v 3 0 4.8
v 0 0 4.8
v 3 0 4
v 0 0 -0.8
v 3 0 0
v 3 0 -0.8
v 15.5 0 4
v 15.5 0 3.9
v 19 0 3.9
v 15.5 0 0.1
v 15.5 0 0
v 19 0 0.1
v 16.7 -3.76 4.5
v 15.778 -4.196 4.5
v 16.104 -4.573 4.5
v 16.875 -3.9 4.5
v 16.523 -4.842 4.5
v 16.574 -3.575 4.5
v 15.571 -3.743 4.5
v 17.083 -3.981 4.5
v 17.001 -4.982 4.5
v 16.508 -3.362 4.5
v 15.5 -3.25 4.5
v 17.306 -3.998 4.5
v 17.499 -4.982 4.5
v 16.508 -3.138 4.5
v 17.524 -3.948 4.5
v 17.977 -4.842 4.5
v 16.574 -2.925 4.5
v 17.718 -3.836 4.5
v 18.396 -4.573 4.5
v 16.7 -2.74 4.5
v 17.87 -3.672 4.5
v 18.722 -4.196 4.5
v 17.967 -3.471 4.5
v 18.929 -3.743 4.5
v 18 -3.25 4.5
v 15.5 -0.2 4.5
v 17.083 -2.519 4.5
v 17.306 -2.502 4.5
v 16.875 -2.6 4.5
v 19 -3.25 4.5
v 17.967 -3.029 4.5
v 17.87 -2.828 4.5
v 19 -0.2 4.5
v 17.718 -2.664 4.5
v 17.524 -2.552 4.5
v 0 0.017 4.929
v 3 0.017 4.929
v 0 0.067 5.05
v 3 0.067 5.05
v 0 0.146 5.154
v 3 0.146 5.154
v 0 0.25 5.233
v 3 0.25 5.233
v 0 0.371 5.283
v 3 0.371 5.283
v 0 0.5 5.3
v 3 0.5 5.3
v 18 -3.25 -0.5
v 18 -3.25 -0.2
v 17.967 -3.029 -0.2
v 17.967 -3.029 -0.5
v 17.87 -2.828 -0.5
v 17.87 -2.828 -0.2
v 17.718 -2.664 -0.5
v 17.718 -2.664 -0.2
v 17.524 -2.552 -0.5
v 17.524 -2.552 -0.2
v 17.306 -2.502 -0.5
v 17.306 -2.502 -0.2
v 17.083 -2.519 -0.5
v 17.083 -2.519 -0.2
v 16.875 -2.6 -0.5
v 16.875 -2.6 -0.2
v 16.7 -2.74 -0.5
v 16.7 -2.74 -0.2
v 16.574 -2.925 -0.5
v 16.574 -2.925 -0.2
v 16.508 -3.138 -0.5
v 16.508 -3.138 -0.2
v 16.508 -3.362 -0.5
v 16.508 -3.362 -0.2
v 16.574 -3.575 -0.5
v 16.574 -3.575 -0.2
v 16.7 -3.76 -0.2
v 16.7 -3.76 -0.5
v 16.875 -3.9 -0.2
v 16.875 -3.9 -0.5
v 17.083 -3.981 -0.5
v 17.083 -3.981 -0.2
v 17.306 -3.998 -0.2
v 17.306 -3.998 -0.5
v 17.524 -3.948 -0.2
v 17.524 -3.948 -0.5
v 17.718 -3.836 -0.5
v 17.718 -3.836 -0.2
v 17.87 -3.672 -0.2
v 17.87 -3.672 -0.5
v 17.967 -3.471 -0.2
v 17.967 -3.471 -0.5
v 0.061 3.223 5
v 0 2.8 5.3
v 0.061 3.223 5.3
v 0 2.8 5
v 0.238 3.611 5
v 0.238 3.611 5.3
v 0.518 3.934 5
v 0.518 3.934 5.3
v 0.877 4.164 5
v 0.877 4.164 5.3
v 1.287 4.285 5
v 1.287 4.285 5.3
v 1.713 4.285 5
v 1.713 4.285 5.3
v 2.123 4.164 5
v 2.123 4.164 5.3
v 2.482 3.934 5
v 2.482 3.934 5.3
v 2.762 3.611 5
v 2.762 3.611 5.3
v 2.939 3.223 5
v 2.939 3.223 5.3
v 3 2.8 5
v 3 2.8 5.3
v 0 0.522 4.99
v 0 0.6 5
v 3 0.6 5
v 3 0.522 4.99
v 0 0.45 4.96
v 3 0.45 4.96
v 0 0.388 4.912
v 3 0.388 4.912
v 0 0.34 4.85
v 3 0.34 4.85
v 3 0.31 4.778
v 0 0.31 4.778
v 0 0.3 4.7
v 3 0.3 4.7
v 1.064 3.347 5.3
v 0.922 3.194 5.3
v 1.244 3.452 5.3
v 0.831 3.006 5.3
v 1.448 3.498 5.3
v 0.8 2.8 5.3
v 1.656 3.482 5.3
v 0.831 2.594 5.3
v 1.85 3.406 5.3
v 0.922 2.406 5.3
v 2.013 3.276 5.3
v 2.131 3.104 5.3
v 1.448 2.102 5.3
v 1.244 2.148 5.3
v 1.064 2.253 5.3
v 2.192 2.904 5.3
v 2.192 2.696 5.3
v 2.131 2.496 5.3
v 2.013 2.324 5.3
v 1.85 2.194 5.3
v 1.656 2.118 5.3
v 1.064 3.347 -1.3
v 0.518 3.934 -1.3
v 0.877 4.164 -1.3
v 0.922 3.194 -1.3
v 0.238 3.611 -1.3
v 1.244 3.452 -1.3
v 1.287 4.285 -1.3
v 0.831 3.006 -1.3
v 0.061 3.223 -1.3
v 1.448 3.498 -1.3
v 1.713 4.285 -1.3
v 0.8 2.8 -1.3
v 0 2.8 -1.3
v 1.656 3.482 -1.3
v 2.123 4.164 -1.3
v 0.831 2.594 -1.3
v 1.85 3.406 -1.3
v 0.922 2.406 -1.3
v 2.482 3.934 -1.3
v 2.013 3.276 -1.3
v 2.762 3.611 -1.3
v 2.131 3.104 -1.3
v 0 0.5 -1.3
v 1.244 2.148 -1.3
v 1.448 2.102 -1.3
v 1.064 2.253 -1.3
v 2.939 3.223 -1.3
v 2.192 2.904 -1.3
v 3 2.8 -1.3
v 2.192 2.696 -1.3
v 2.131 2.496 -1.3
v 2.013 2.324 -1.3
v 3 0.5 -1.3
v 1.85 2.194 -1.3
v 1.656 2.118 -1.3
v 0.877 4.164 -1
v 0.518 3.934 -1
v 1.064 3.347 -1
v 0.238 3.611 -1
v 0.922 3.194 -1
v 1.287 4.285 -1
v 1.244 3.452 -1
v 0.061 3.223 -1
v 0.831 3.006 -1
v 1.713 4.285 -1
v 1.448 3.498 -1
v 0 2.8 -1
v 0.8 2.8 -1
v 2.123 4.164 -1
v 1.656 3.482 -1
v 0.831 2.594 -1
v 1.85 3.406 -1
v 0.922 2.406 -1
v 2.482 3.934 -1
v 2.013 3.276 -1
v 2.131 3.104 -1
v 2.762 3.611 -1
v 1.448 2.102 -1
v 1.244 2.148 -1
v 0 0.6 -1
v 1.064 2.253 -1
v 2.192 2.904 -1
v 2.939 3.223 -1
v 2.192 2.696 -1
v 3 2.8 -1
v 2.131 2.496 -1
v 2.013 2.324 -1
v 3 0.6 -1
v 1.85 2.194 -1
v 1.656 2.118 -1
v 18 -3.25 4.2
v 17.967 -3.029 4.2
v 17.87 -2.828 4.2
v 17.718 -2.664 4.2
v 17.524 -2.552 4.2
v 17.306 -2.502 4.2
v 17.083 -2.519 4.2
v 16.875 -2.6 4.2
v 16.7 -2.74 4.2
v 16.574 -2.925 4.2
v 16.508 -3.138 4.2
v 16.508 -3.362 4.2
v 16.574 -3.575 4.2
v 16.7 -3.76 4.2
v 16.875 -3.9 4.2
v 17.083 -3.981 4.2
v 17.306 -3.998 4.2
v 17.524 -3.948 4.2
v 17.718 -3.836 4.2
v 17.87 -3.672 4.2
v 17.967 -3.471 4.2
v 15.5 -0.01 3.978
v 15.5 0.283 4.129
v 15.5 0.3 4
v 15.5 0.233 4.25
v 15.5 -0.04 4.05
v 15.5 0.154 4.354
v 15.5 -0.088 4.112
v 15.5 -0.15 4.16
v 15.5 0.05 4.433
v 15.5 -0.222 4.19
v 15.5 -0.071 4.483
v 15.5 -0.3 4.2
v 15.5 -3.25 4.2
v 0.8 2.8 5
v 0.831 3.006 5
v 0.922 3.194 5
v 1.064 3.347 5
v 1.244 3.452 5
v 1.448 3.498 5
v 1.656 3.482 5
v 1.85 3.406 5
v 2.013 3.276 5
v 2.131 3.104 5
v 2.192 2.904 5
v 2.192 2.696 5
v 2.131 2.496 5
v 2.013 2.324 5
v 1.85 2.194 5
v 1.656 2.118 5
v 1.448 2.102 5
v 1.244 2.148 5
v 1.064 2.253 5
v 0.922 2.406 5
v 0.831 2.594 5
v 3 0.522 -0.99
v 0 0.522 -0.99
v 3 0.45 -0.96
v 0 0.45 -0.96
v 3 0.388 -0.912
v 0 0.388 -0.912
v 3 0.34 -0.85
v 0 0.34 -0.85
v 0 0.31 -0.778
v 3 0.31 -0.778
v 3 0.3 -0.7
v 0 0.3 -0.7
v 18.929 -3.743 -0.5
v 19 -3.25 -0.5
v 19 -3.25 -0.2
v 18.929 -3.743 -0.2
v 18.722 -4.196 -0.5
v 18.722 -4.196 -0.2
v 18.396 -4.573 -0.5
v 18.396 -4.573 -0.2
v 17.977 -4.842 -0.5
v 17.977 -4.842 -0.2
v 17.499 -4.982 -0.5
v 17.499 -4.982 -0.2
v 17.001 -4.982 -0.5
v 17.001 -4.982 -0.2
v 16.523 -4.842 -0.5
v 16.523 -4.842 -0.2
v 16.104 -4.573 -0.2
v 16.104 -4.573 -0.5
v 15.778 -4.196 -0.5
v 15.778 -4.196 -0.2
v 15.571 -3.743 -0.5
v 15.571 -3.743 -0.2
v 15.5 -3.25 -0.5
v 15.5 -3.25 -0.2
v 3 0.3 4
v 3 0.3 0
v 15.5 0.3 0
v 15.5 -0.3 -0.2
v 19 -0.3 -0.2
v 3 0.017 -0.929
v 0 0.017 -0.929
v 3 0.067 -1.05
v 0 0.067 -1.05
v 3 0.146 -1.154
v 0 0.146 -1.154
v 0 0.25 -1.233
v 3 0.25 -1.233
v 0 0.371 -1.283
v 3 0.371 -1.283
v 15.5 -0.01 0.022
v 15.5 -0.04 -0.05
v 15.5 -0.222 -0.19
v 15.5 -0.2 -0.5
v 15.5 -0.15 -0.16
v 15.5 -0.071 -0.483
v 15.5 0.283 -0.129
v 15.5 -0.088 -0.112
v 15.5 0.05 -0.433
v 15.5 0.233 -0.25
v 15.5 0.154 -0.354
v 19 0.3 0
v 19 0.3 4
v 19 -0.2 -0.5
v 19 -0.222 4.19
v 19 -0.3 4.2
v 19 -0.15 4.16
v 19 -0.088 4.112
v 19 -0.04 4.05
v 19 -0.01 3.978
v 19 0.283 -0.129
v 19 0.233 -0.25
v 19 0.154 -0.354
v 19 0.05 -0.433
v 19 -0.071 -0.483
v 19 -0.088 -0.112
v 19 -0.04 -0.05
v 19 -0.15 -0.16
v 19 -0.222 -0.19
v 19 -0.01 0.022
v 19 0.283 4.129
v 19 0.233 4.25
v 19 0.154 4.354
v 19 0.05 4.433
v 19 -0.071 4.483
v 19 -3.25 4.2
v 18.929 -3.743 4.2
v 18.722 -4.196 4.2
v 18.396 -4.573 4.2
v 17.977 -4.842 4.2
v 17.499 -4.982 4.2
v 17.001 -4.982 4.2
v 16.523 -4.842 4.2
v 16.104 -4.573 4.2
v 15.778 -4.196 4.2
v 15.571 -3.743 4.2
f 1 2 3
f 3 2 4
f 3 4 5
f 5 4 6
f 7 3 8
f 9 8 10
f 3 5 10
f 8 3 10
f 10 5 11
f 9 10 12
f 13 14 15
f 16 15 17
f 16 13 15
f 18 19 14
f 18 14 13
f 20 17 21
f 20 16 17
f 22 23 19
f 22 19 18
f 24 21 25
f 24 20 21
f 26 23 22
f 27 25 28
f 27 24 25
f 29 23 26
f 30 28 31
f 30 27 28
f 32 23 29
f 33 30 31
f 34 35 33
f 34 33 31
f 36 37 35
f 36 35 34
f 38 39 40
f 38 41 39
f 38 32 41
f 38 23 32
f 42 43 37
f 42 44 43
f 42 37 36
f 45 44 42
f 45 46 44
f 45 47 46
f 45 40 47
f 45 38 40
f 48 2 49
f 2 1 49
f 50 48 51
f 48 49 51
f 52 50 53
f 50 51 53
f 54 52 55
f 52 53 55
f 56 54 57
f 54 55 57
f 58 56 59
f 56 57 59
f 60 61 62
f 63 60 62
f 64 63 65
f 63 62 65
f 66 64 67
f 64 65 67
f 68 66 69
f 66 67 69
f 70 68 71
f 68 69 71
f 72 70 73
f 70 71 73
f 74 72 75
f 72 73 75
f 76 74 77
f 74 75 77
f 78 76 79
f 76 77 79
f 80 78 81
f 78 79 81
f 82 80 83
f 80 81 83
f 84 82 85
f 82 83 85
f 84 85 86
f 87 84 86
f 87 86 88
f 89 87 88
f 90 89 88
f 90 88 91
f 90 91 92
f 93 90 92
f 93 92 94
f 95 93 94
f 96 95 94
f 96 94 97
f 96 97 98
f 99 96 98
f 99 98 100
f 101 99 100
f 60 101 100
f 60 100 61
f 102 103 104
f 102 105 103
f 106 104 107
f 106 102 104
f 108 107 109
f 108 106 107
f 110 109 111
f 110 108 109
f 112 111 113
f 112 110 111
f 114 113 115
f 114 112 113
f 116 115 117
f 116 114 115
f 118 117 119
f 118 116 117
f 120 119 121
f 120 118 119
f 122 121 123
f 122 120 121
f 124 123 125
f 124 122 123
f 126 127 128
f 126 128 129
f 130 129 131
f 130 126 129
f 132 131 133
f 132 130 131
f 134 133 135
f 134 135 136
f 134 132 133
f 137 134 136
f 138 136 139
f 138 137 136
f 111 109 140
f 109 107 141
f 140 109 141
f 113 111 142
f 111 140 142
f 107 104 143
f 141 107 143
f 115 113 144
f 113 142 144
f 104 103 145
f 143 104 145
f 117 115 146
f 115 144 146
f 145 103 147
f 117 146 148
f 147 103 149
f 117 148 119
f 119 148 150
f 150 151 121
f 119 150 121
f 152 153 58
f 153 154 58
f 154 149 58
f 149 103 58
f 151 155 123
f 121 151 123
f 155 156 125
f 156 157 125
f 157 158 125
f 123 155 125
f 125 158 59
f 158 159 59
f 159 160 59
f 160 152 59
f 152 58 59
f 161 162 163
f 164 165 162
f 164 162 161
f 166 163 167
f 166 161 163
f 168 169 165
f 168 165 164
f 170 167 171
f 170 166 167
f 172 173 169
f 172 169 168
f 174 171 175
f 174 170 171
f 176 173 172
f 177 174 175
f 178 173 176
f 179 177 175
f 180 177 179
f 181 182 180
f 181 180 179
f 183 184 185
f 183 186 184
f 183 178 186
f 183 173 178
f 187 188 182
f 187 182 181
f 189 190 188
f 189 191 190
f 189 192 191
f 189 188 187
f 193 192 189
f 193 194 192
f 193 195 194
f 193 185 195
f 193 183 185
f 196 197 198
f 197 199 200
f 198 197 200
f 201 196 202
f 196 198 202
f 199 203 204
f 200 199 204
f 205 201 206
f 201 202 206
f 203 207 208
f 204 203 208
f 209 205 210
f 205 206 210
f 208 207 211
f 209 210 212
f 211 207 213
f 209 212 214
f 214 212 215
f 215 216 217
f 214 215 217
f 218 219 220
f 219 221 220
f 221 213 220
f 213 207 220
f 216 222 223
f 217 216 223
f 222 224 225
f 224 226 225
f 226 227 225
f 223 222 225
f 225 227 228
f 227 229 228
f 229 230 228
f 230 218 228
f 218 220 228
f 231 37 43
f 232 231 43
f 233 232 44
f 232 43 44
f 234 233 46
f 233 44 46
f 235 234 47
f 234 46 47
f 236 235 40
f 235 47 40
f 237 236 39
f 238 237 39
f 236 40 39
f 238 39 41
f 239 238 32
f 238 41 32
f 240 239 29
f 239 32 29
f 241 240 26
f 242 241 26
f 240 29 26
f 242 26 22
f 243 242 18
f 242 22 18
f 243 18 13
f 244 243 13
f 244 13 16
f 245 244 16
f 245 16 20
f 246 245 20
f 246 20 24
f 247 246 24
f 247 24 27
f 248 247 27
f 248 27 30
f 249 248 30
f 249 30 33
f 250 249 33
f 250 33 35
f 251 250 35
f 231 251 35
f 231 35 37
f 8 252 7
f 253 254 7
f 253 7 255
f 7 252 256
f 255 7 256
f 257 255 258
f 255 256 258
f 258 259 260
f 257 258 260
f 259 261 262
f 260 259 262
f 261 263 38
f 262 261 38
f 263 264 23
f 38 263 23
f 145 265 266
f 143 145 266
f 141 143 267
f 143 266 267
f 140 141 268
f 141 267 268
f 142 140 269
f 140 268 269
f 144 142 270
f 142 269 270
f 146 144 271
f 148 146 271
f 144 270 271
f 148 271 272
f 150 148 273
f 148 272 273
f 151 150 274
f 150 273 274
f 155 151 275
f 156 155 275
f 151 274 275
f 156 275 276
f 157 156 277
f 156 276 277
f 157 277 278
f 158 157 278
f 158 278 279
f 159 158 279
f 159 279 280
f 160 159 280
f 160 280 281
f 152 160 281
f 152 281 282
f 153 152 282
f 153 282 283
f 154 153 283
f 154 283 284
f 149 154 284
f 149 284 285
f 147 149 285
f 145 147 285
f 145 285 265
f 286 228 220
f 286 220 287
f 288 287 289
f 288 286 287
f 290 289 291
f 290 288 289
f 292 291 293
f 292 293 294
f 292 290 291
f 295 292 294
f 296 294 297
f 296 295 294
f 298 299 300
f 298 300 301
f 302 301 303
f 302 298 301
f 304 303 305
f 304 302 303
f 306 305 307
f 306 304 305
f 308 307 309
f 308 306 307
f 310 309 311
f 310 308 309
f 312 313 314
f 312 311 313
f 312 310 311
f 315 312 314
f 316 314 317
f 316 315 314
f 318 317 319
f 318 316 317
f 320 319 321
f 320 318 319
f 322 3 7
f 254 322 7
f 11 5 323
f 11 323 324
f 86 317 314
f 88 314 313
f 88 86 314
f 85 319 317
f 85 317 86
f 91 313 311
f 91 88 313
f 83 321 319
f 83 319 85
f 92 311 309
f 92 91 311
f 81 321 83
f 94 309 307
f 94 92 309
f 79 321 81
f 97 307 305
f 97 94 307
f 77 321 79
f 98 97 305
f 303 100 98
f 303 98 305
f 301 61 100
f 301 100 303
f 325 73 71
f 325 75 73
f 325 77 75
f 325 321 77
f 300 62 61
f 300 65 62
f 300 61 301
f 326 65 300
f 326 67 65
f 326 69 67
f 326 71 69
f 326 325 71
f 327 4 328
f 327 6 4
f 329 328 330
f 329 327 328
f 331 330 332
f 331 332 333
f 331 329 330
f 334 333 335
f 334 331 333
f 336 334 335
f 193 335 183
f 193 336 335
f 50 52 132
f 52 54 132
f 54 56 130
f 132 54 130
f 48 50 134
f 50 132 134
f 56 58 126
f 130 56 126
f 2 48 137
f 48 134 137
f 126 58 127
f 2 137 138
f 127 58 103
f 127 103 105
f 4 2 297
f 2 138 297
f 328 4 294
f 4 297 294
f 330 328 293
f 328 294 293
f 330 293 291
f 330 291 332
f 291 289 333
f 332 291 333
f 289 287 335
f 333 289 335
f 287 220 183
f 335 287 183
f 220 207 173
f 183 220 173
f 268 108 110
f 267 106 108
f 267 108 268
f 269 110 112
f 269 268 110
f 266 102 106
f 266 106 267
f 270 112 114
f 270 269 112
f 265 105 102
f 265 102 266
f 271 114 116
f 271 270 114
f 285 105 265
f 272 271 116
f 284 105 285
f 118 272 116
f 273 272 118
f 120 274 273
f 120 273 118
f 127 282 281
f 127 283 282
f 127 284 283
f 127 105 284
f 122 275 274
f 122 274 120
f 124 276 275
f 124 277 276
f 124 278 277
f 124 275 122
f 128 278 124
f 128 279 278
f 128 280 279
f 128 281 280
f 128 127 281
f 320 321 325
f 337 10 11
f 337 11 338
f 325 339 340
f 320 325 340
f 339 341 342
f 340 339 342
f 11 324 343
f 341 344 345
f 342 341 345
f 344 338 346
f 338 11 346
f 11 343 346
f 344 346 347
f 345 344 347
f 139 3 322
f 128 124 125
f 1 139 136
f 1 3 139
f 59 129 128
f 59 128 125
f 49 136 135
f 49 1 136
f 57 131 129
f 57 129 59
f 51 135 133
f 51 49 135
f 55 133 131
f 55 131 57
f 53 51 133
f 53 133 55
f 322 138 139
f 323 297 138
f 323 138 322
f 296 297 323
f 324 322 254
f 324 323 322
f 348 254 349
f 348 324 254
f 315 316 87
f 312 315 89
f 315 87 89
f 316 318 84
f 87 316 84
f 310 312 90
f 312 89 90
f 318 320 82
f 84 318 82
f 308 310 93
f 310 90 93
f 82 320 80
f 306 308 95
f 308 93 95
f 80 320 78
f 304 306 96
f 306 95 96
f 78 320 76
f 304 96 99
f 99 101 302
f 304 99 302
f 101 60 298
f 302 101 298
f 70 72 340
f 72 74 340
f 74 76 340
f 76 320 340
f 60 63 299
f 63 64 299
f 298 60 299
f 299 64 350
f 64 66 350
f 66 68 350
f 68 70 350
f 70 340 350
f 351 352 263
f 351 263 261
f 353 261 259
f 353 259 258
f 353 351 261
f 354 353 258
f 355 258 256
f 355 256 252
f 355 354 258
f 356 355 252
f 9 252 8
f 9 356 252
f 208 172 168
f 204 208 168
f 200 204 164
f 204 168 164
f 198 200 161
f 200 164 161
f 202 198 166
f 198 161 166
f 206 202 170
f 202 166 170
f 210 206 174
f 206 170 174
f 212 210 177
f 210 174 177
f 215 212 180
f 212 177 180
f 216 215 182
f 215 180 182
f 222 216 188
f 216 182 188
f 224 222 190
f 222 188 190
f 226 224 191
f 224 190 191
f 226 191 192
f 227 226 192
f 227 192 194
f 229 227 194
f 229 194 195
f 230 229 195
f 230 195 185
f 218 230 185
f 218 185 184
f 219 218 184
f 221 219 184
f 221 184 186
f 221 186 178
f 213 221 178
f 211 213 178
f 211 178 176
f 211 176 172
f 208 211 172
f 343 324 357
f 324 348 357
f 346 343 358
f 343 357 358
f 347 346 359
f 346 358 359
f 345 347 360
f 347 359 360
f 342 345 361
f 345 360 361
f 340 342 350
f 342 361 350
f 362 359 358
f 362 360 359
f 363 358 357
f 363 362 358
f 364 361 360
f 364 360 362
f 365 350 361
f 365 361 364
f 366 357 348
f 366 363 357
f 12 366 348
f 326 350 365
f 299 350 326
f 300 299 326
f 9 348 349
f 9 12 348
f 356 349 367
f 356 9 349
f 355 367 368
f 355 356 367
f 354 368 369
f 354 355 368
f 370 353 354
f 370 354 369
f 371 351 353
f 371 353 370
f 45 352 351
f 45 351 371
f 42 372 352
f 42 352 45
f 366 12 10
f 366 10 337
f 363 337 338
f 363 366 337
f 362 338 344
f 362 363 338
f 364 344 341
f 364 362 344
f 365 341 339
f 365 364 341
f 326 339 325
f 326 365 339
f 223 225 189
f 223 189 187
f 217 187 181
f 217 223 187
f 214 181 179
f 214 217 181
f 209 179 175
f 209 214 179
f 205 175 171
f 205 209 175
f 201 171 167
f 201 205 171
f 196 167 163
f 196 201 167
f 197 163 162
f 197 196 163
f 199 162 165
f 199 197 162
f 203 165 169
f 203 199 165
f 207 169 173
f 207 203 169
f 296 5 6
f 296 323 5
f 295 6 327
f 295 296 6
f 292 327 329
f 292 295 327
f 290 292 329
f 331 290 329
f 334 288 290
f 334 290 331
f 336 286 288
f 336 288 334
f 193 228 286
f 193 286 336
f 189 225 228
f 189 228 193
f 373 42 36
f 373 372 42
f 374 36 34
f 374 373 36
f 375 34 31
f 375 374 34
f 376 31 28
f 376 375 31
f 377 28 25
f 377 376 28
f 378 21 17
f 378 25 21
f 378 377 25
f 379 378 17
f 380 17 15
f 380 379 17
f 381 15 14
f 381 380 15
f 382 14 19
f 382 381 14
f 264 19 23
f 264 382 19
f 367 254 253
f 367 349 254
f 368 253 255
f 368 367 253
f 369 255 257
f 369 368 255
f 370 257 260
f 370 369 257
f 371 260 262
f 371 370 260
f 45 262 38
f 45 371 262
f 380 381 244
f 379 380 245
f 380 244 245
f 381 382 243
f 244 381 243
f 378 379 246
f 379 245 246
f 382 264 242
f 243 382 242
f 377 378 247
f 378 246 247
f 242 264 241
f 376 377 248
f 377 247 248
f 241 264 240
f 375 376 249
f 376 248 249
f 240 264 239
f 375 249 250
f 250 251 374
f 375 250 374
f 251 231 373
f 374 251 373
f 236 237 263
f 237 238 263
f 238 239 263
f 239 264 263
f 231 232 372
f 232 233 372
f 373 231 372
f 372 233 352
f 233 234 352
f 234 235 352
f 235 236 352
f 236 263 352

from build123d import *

# Parameters (mm, degrees)
SKETCH1_W           = 19
SKETCH1_H           = 4
BOSS_EXTRUDE1_DEPTH = 0.3
SKETCH2_W           = 3
SKETCH2_H           = 1.3
BOSS_EXTRUDE2_DEPTH = 0.3
SKETCH3_W           = 3
SKETCH3_H           = 0.3
BOSS_EXTRUDE3_DEPTH = 4
FILLET1_RADIUS      = 1.5
FILLET1_LENGTH      = 0.3
FILLET2_RADIUS      = 1.5
FILLET2_LENGTH      = 0.3
SKETCH4_R           = 0.7
CUT_EXTRUDE1_DEPTH  = 21.568179307
SKETCH6_W           = 3.5
SKETCH6_H           = 0.5
BOSS_EXTRUDE4_DEPTH = 0.3
SKETCH7_W           = 3.5
SKETCH7_H           = 0.3
BOSS_EXTRUDE5_DEPTH = 5
FILLET3_RADIUS      = 1.75
FILLET3_LENGTH      = 0.3
FILLET4_RADIUS      = 1.75
FILLET4_LENGTH      = 0.3
SKETCH8_R           = 0.75
CUT_EXTRUDE2_DEPTH  = 21.485116548
FILLET5_R           = 0.3
FILLET6_R           = 0.5


with BuildPart() as part:
    # Sketch1 → Boss-Extrude1 (new body)
    with BuildSketch(Plane(origin=(0, 0, 0), x_dir=(1, 0, 0), z_dir=(0, 1, 0))):
        with Locations((9.5, -2)):
            Rectangle(SKETCH1_W, SKETCH1_H)
    extrude(amount=BOSS_EXTRUDE1_DEPTH)

    # Sketch2 → Boss-Extrude2 (add)
    with BuildSketch(Plane.XZ):
        with Locations((1.5, -0.65)):
            Rectangle(SKETCH2_W, SKETCH2_H)
        with Locations((1.5, 4.65)):
            Rectangle(SKETCH2_W, SKETCH2_H)
    extrude(amount=-BOSS_EXTRUDE2_DEPTH)

    # Sketch3 → Boss-Extrude3 (add)
    with BuildSketch(Plane(origin=(0, 0.3, 0), x_dir=(1, 0, 0), z_dir=(0, 1, 0))):
        with Locations((1.5, 1.15)):
            Rectangle(SKETCH3_W, SKETCH3_H)
        with Locations((1.5, -5.15)):
            Rectangle(SKETCH3_W, SKETCH3_H)
    extrude(amount=BOSS_EXTRUDE3_DEPTH)

    # Fillet1: full round fillet: the end face becomes a half cylinder, R = half its width
    fillet1_face = Plane((1.5, 4.3, -1.15), x_dir=(0, 0, 1), z_dir=(0, 1, 0))  # on the end face: x along it, z out of the body
    fillet1_slab = fillet1_face.offset(-FILLET1_RADIUS / 2) * Box(FILLET1_LENGTH, 2 * FILLET1_RADIUS, FILLET1_RADIUS, mode=Mode.PRIVATE)  # the body's end, R deep
    fillet1_round = Plane((1.5, 2.8, -1.15), x_dir=(0, 1, 0), z_dir=(0, 0, 1)) * Cylinder(FILLET1_RADIUS, FILLET1_LENGTH, mode=Mode.PRIVATE)  # its axis R under the face
    add(fillet1_slab - fillet1_round, mode=Mode.SUBTRACT)

    # Fillet2: full round fillet: the end face becomes a half cylinder, R = half its width
    fillet2_face = Plane((1.5, 4.3, 5.15), x_dir=(0, 0, -1), z_dir=(0, 1, 0))  # on the end face: x along it, z out of the body
    fillet2_slab = fillet2_face.offset(-FILLET2_RADIUS / 2) * Box(FILLET2_LENGTH, 2 * FILLET2_RADIUS, FILLET2_RADIUS, mode=Mode.PRIVATE)  # the body's end, R deep
    fillet2_round = Plane((1.5, 2.8, 5.15), x_dir=(0, 1, 0), z_dir=(0, 0, -1)) * Cylinder(FILLET2_RADIUS, FILLET2_LENGTH, mode=Mode.PRIVATE)  # its axis R under the face
    add(fillet2_slab - fillet2_round, mode=Mode.SUBTRACT)

    # Sketch4 → Cut-Extrude1 (cut, through all)
    with BuildSketch(Plane(origin=(0, 0, -1.3), x_dir=(-1, 0, 0), z_dir=(0, 0, -1))):
        with Locations((-1.5, 2.8)):
            Circle(SKETCH4_R)
    extrude(amount=-CUT_EXTRUDE1_DEPTH, mode=Mode.SUBTRACT)

    # Sketch6 → Boss-Extrude4 (add)
    with BuildSketch(Plane(origin=(0, 0.3, 0), x_dir=(1, 0, 0), z_dir=(0, 1, 0))):
        with Locations((17.25, 0.25)):
            Rectangle(SKETCH6_W, SKETCH6_H)
        with Locations((17.25, -4.25)):
            Rectangle(SKETCH6_W, SKETCH6_H)
    extrude(amount=-BOSS_EXTRUDE4_DEPTH)

    # Sketch7 → Boss-Extrude5 (add)
    with BuildSketch(Plane.XZ):
        with Locations((17.25, -0.35)):
            Rectangle(SKETCH7_W, SKETCH7_H)
        with Locations((17.25, 4.35)):
            Rectangle(SKETCH7_W, SKETCH7_H)
    extrude(amount=BOSS_EXTRUDE5_DEPTH)

    # Fillet3: full round fillet: the end face becomes a half cylinder, R = half its width
    fillet3_face = Plane((17.25, -5, 4.35), x_dir=(0, 0, -1), z_dir=(0, -1, 0))  # on the end face: x along it, z out of the body
    fillet3_slab = fillet3_face.offset(-FILLET3_RADIUS / 2) * Box(FILLET3_LENGTH, 2 * FILLET3_RADIUS, FILLET3_RADIUS, mode=Mode.PRIVATE)  # the body's end, R deep
    fillet3_round = Plane((17.25, -3.25, 4.35), x_dir=(0, -1, 0), z_dir=(0, 0, -1)) * Cylinder(FILLET3_RADIUS, FILLET3_LENGTH, mode=Mode.PRIVATE)  # its axis R under the face
    add(fillet3_slab - fillet3_round, mode=Mode.SUBTRACT)

    # Fillet4: full round fillet: the end face becomes a half cylinder, R = half its width
    fillet4_face = Plane((17.25, -5, -0.35), x_dir=(0, 0, -1), z_dir=(0, -1, 0))  # on the end face: x along it, z out of the body
    fillet4_slab = fillet4_face.offset(-FILLET4_RADIUS / 2) * Box(FILLET4_LENGTH, 2 * FILLET4_RADIUS, FILLET4_RADIUS, mode=Mode.PRIVATE)  # the body's end, R deep
    fillet4_round = Plane((17.25, -3.25, -0.35), x_dir=(0, -1, 0), z_dir=(0, 0, -1)) * Cylinder(FILLET4_RADIUS, FILLET4_LENGTH, mode=Mode.PRIVATE)  # its axis R under the face
    add(fillet4_slab - fillet4_round, mode=Mode.SUBTRACT)

    # Sketch8 → Cut-Extrude2 (cut, through all)
    with BuildSketch(Plane.XY.offset(4.5)):
        with Locations((17.25, -3.25)):
            Circle(SKETCH8_R)
    extrude(amount=-CUT_EXTRUDE2_DEPTH, mode=Mode.SUBTRACT)

    # Fillet5
    # the kernel refuses this fillet: 0.3 mm, written as the material it adds along each edge
    with BuildSketch(Plane(origin=(19, 0, -0.2), x_dir=(0, 0, 1), z_dir=(-1, 0, 0))) as fillet5_piece_1:
        with BuildLine():
            CenterArc((FILLET5_R, -FILLET5_R), FILLET5_R, 90, 90)
            Line((0, -FILLET5_R), (0, 0))
            Line((0, 0), (FILLET5_R, 0))
        make_face()
    extrude(amount=3.5)
    with BuildSketch(Plane(origin=(19, 0, 4.2), x_dir=(0, 0, -1), z_dir=(-1, 0, 0))) as fillet5_piece_2:
        with BuildLine():
            CenterArc((FILLET5_R, FILLET5_R), FILLET5_R, 180, 90)
            Line((0, FILLET5_R), (0, 0))
            Line((0, 0), (FILLET5_R, 0))
        make_face()
    extrude(amount=3.5)
    with BuildSketch(Plane(origin=(3, 0.3, -1), x_dir=(0, 0, 1), z_dir=(-1, 0, 0)), Plane(origin=(0, 0.3, 5), x_dir=(0, 0, -1), z_dir=(1, 0, 0))) as fillet5_piece_3:
        with BuildLine():
            CenterArc((FILLET5_R, FILLET5_R), FILLET5_R, 180, 90)
            Line((0, FILLET5_R), (0, 0))
            Line((0, 0), (FILLET5_R, 0))
        make_face()
    extrude(amount=3)

    # Fillet6
    fillet6_edges = [part.edges().sort_by_distance(p)[0] for p in [
        (1.5, 0, 5.3),
        (1.5, 0, -1.3),
        (17.25, 0.3, 4.5),
        (17.25, 0.3, -0.5),
    ]]
    fillet(fillet6_edges, radius=FILLET6_R)


solid = part.part
